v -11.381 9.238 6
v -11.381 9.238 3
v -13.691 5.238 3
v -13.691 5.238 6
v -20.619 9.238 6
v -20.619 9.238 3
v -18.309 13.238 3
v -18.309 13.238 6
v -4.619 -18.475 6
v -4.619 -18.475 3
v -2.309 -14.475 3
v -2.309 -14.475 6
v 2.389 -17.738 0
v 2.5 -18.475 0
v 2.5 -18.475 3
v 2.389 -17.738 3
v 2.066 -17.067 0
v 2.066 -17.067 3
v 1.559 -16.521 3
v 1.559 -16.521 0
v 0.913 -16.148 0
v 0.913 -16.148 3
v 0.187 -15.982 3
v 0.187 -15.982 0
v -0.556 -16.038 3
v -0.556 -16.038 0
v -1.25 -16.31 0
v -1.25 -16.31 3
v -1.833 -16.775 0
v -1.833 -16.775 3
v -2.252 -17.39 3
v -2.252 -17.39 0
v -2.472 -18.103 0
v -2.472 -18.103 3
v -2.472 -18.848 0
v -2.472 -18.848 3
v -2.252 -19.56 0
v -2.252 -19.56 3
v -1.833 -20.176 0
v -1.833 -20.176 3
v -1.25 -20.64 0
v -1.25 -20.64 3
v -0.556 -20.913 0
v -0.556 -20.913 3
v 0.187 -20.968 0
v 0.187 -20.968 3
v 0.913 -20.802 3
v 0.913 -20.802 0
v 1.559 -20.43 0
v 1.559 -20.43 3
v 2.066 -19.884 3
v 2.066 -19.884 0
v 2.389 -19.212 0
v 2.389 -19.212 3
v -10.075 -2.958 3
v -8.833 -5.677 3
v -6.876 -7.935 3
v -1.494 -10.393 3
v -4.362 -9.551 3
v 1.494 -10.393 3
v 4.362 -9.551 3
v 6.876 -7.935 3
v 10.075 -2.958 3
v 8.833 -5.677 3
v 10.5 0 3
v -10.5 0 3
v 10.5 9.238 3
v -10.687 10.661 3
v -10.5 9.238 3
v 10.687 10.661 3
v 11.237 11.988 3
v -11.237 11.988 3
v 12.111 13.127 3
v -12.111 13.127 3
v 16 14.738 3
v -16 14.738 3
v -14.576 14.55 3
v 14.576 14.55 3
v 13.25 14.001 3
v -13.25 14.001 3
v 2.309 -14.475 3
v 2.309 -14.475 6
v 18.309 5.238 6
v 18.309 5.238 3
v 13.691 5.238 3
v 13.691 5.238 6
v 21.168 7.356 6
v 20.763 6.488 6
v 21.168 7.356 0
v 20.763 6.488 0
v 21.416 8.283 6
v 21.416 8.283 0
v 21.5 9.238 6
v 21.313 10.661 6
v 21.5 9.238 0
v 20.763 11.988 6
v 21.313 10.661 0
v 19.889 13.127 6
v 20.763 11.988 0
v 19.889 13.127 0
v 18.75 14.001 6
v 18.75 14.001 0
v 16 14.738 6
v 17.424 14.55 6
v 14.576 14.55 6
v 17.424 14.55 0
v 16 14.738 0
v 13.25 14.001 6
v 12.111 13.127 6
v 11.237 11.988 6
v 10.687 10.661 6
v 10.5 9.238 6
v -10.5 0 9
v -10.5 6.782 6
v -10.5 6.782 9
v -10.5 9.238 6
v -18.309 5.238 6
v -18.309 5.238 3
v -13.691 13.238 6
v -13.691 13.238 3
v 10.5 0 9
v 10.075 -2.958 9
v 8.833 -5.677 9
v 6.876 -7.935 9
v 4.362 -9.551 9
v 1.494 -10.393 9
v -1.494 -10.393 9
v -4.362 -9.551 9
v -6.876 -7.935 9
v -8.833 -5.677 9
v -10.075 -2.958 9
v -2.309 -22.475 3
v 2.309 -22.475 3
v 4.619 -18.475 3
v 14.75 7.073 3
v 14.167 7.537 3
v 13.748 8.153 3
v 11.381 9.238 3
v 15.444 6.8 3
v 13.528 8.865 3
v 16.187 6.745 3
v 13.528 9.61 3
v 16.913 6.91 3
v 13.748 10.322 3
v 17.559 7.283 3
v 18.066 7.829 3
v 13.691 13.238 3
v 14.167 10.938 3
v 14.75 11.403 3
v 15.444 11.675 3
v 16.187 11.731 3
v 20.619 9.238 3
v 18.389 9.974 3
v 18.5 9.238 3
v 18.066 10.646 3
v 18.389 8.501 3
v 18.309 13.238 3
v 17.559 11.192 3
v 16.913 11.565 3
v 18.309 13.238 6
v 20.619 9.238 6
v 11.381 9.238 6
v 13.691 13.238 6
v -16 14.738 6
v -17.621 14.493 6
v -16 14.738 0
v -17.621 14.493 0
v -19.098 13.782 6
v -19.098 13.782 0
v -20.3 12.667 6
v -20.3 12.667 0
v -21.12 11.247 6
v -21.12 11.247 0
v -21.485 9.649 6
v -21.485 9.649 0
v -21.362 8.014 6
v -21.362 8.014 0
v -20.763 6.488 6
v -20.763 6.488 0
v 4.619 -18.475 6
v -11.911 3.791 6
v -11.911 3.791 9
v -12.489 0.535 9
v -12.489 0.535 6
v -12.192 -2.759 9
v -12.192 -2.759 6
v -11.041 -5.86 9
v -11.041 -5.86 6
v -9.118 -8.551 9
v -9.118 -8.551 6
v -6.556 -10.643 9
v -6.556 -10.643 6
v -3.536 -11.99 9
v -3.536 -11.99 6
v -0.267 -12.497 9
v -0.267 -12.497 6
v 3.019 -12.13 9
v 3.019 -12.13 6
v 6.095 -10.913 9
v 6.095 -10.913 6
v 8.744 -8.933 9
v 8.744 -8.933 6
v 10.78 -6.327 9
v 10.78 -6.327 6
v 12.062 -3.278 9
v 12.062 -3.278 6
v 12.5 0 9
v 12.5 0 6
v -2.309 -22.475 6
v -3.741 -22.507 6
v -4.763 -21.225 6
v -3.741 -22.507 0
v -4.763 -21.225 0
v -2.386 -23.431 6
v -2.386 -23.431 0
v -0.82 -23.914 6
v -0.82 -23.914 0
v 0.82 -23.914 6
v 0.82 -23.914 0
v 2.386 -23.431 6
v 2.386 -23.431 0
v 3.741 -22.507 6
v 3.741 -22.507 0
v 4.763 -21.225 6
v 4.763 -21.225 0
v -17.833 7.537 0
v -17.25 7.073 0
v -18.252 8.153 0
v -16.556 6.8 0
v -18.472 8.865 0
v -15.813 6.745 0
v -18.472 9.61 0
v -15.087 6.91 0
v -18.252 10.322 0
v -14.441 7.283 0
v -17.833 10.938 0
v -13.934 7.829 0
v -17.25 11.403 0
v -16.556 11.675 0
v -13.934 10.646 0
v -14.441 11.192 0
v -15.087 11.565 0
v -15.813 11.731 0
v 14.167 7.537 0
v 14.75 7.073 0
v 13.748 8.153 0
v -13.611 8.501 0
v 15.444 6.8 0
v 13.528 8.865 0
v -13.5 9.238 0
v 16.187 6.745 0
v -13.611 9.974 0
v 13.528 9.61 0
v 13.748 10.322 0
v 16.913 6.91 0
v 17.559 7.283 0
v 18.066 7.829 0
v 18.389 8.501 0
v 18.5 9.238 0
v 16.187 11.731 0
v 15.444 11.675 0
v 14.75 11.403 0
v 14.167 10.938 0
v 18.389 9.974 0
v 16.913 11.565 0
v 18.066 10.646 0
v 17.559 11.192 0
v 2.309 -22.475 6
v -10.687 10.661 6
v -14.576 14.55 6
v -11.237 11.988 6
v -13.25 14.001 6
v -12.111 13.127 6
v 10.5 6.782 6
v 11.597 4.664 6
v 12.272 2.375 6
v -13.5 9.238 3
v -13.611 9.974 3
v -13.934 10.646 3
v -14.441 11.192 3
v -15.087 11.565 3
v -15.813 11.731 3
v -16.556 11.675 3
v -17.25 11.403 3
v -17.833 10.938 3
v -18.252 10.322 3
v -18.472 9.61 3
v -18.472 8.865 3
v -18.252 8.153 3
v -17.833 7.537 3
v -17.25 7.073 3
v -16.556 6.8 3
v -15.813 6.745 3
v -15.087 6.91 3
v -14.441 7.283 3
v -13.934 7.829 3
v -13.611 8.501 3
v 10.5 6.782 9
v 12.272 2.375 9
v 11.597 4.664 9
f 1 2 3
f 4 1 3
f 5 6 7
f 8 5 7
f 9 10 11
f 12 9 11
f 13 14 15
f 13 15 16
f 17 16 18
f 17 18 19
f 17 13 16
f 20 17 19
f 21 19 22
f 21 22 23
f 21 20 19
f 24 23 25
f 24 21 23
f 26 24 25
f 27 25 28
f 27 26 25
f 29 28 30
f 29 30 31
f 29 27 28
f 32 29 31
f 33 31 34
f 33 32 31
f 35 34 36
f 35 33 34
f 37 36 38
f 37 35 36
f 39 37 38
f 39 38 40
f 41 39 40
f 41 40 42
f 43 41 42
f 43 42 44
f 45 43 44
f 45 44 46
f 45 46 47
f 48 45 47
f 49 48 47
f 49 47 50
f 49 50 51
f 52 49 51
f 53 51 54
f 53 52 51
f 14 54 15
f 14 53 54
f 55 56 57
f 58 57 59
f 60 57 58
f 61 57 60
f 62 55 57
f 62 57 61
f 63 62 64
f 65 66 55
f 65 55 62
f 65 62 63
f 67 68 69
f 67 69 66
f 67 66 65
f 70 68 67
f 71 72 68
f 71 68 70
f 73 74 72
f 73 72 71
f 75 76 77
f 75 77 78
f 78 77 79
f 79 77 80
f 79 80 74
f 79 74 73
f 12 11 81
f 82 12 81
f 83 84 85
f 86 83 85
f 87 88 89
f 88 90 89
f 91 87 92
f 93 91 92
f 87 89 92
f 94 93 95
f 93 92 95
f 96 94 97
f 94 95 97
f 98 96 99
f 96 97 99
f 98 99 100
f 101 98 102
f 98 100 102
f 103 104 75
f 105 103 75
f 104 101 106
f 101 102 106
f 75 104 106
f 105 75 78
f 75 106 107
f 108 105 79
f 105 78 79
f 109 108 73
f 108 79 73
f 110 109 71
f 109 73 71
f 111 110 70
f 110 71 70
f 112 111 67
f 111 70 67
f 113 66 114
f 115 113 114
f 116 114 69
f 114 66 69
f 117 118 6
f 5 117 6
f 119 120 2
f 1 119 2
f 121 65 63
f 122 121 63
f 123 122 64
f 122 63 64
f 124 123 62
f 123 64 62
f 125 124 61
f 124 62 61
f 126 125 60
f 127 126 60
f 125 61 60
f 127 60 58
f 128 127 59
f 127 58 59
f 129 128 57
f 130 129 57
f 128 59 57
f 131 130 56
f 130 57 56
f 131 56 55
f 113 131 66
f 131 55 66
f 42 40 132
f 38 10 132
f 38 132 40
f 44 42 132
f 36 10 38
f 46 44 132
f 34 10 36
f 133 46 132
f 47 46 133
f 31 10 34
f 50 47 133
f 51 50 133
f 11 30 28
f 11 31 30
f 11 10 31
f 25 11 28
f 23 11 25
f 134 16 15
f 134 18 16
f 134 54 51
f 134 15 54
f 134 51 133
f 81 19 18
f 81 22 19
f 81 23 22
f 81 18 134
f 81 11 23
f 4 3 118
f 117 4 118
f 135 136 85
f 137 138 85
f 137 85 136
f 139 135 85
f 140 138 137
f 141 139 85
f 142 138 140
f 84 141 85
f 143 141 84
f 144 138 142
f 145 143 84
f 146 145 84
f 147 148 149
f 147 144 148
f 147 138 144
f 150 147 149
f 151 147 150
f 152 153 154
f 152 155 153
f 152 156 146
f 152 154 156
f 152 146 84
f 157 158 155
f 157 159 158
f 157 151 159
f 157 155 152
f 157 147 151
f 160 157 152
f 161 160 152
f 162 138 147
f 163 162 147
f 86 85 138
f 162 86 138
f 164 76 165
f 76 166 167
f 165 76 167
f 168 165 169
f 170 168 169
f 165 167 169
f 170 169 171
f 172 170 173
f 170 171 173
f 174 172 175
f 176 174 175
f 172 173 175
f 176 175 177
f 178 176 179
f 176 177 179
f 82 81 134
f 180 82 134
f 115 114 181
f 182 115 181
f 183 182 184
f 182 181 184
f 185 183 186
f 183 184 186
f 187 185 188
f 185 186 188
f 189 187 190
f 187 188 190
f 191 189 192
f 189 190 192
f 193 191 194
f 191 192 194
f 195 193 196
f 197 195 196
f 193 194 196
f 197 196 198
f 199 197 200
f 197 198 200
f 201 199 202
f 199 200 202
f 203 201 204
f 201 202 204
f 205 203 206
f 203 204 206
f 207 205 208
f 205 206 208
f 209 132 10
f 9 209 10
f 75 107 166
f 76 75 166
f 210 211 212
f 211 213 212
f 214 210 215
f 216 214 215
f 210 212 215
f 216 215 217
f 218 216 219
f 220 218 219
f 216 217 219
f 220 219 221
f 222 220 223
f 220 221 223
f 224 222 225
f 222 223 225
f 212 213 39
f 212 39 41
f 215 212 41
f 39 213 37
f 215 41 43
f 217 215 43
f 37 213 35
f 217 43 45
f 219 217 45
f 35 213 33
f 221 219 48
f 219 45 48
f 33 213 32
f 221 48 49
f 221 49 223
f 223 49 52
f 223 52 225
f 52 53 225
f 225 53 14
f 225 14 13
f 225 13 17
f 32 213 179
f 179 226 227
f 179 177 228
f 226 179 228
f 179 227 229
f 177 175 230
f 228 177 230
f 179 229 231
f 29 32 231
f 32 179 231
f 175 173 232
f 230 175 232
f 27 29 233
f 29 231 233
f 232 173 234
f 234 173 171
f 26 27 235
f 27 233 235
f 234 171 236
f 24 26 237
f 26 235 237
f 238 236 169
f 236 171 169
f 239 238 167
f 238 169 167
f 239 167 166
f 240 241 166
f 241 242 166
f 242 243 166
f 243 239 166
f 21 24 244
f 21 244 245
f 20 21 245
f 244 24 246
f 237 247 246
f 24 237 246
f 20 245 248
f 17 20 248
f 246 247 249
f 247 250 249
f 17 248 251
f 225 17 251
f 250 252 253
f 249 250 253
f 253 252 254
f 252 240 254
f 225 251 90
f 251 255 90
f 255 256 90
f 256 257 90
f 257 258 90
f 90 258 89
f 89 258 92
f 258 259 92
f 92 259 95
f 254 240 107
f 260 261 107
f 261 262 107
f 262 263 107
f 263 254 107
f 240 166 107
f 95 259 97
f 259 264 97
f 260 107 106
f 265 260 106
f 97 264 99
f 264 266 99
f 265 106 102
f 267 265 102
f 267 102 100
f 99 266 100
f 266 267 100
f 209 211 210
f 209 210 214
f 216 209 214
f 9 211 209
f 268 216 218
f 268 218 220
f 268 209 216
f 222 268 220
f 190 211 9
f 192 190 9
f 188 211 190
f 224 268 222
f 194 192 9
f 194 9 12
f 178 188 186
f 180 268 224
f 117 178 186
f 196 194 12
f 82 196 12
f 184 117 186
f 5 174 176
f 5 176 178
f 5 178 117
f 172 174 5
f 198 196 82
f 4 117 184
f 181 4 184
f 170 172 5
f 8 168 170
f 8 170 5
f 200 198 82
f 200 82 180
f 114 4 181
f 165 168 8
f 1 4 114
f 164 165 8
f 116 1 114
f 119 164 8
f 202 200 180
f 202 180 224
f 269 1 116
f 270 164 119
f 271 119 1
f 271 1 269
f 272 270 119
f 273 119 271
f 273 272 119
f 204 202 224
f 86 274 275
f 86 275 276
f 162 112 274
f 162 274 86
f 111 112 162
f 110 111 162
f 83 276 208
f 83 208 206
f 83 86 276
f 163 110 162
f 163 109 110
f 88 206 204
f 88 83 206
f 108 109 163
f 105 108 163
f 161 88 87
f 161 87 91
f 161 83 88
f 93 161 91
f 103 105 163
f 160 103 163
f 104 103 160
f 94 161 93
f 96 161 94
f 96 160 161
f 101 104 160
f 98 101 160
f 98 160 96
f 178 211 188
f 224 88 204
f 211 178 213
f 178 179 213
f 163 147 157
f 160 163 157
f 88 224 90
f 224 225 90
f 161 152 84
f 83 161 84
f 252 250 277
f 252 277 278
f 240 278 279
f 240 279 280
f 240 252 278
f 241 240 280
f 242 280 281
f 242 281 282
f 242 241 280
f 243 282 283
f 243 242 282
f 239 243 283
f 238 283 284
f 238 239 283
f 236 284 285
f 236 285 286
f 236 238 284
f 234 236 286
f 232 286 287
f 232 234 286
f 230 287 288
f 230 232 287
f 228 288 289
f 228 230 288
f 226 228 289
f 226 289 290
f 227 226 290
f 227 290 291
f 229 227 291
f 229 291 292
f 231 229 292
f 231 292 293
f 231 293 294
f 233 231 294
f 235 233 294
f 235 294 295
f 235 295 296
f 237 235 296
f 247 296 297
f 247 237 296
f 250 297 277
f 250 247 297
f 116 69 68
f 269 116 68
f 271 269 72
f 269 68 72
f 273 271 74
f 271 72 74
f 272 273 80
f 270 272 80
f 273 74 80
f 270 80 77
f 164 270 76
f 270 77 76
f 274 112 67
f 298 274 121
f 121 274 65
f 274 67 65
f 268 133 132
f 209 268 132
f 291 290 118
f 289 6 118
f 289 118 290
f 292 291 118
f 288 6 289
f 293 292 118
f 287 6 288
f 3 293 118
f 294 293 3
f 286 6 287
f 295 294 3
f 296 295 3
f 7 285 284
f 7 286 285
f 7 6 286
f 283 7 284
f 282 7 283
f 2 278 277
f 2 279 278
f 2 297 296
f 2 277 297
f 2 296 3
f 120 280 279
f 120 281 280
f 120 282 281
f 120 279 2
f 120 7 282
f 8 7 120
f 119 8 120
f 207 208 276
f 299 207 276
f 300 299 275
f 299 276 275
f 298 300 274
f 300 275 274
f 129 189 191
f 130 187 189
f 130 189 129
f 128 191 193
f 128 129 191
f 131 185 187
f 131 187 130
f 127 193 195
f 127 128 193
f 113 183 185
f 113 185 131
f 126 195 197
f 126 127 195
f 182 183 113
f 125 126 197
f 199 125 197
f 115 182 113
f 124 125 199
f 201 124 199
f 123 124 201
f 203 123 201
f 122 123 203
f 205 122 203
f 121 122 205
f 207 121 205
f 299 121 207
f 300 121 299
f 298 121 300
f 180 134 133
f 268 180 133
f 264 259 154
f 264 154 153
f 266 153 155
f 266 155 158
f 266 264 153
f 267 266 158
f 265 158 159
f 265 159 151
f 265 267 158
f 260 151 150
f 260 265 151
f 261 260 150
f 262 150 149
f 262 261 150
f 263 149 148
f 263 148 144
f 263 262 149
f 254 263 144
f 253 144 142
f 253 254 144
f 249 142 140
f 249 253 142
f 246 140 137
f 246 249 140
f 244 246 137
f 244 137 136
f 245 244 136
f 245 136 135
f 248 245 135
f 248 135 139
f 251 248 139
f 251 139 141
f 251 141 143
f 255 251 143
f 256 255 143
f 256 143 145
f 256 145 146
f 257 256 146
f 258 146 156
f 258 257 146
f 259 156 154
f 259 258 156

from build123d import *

# Parameters (mm, degrees)
F0_R     = 2.5
F1_DEPTH = 3
F2_START = 3
F2_DEPTH = 3
F3_START = 3
F3_DEPTH = 6


# Not quite as in the source:
# - a feature names something its author has since deleted; it is built from what else it names


with BuildPart() as f1:
    # F0 (on Top) → F1 (new body)
    with BuildSketch(Plane.XY):
        with BuildLine():
            ThreePointArc((-10.5, 0), (0, -10.5), (10.5, 0))
            ThreePointArc((10.5, 0), (0, 10.5), (-10.5, 0))
        make_face()
        with BuildLine():
            Line((10.5, 9.237604307), (10.5, 6.7823299831))
            ThreePointArc((10.5, 6.7823299831), (11.9895788083, 3.5355339059), (12.5, 0))
            ThreePointArc((12.5, 0), (-3.5355339059, -11.9895788083), (-10.5, 6.7823299831))
            Line((-10.5, 6.7823299831), (-10.5, 9.237604307))
            ThreePointArc((-10.5, 9.237604307), (-14.5764952519, 3.9250122624), (-20.7631397208, 6.487604307))
            Line((-20.7631397208, 6.487604307), (-4.7631397208, -21.2252086141))
            ThreePointArc((-4.7631397208, -21.2252086141), (-1.4235047481, -13.1626165695), (5.5, -18.4752086141))
            ThreePointArc((5.5, -18.4752086141), (5.3125920446, -19.8987133621), (4.7631397208, -21.2252086141))
            Line((4.7631397208, -21.2252086141), (20.7631397208, 6.487604307))
            ThreePointArc((20.7631397208, 6.487604307), (14.5764952519, 3.9250122624), (10.5, 9.237604307))
        make_face()
        with BuildLine():
            ThreePointArc((16, 14.737604307), (12.1109127035, 13.1266916036), (10.5, 9.237604307))
            ThreePointArc((10.5, 9.237604307), (14.5764952519, 3.9250122624), (20.7631397208, 6.487604307))
            ThreePointArc((20.7631397208, 6.487604307), (21.3125920446, 7.814099559), (21.5, 9.237604307))
            ThreePointArc((21.5, 9.237604307), (19.8890872965, 13.1266916036), (16, 14.737604307))
        make_face()
        Polygon((11.3811978465, 9.237604307), (13.6905989232, 13.237604307), (18.3094010768, 13.237604307), (20.6188021535, 9.237604307), (18.3094010768, 5.237604307), (13.6905989232, 5.237604307), align=None, mode=Mode.SUBTRACT)
        with BuildLine():
            ThreePointArc((-20.7631397208, 6.487604307), (-14.5764952519, 3.9250122624), (-10.5, 9.237604307))
            ThreePointArc((-10.5, 9.237604307), (-12.1109127035, 13.1266916036), (-16, 14.737604307))
            ThreePointArc((-16, 14.737604307), (-20.7631397208, 11.987604307), (-20.7631397208, 6.487604307))
        make_face()
        Polygon((-18.3094010768, 13.237604307), (-13.6905989232, 13.237604307), (-11.3811978465, 9.237604307), (-13.6905989232, 5.237604307), (-18.3094010768, 5.237604307), (-20.6188021535, 9.237604307), align=None, mode=Mode.SUBTRACT)
        with BuildLine():
            ThreePointArc((-4.7631397208, -21.2252086141), (0, -23.9752086141), (4.7631397208, -21.2252086141))
            ThreePointArc((4.7631397208, -21.2252086141), (5.3125920446, -19.8987133621), (5.5, -18.4752086141))
            ThreePointArc((5.5, -18.4752086141), (-1.4235047481, -13.1626165695), (-4.7631397208, -21.2252086141))
        make_face()
        Polygon((-2.3094010768, -22.4752086141), (-4.6188021535, -18.4752086141), (-2.3094010768, -14.4752086141), (2.3094010768, -14.4752086141), (4.6188021535, -18.4752086141), (2.3094010768, -22.4752086141), align=None, mode=Mode.SUBTRACT)
        with BuildLine():
            Line((10.5, 6.7823299831), (10.5, 0))
            ThreePointArc((10.5, 0), (0, -10.5), (-10.5, 0))
            Line((-10.5, 0), (-10.5, 6.7823299831))
            ThreePointArc((-10.5, 6.7823299831), (-3.5355339059, -11.9895788083), (12.5, 0))
            ThreePointArc((12.5, 0), (11.9895788083, 3.5355339059), (10.5, 6.7823299831))
        make_face()
        with BuildLine():
            ThreePointArc((-10.5, 6.7823299831), (0, 12.5), (10.5, 6.7823299831))
            Line((10.5, 6.7823299831), (10.5, 9.237604307))
            Line((10.5, 9.237604307), (10.5, 14.737604307))
            Line((10.5, 14.737604307), (-10.5, 14.737604307))
            Line((-10.5, 14.737604307), (-10.5, 9.237604307))
            Line((-10.5, 9.237604307), (-10.5, 6.7823299831))
        make_face()
        Polygon((18.3094010768, 13.237604307), (13.6905989232, 13.237604307), (11.3811978465, 9.237604307), (13.6905989232, 5.237604307), (18.3094010768, 5.237604307), (20.6188021535, 9.237604307), align=None)
        with Locations((16, 9.237604307)):
            Circle(F0_R, mode=Mode.SUBTRACT)
        Polygon((-2.3094010768, -14.4752086141), (-4.6188021535, -18.4752086141), (-2.3094010768, -22.4752086141), (2.3094010768, -22.4752086141), (4.6188021535, -18.4752086141), (2.3094010768, -14.4752086141), align=None)
        with Locations((0, -18.4752086141)):
            Circle(F0_R, mode=Mode.SUBTRACT)
        Polygon((-11.3811978465, 9.237604307), (-13.6905989232, 13.237604307), (-18.3094010768, 13.237604307), (-20.6188021535, 9.237604307), (-18.3094010768, 5.237604307), (-13.6905989232, 5.237604307), align=None)
        with Locations((-16, 9.237604307)):
            Circle(F0_R, mode=Mode.SUBTRACT)
        with BuildLine():
            ThreePointArc((-10.5, 0), (0, 10.5), (10.5, 0))
            Line((10.5, 0), (10.5, 6.7823299831))
            ThreePointArc((10.5, 6.7823299831), (0, 12.5), (-10.5, 6.7823299831))
            Line((-10.5, 6.7823299831), (-10.5, 0))
        make_face()
        with BuildLine():
            Line((10.5, 14.737604307), (10.5, 9.237604307))
            ThreePointArc((10.5, 9.237604307), (12.1109127035, 13.1266916036), (16, 14.737604307))
            Line((16, 14.737604307), (10.5, 14.737604307))
        make_face()
        with BuildLine():
            ThreePointArc((-16, 14.737604307), (-12.1109127035, 13.1266916036), (-10.5, 9.237604307))
            Line((-10.5, 9.237604307), (-10.5, 14.737604307))
            Line((-10.5, 14.737604307), (-16, 14.737604307))
        make_face()
    extrude(amount=F1_DEPTH)

    # F0 (on Top) → F2 (join)
    with BuildSketch(Plane.XY.offset(F2_START)):
        with BuildLine():
            ThreePointArc((-20.7631397208, 6.487604307), (-14.5764952519, 3.9250122624), (-10.5, 9.237604307))
            ThreePointArc((-10.5, 9.237604307), (-12.1109127035, 13.1266916036), (-16, 14.737604307))
            ThreePointArc((-16, 14.737604307), (-20.7631397208, 11.987604307), (-20.7631397208, 6.487604307))
        make_face()
        Polygon((-18.3094010768, 13.237604307), (-13.6905989232, 13.237604307), (-11.3811978465, 9.237604307), (-13.6905989232, 5.237604307), (-18.3094010768, 5.237604307), (-20.6188021535, 9.237604307), align=None, mode=Mode.SUBTRACT)
        with BuildLine():
            ThreePointArc((-4.7631397208, -21.2252086141), (0, -23.9752086141), (4.7631397208, -21.2252086141))
            ThreePointArc((4.7631397208, -21.2252086141), (5.3125920446, -19.8987133621), (5.5, -18.4752086141))
            ThreePointArc((5.5, -18.4752086141), (-1.4235047481, -13.1626165695), (-4.7631397208, -21.2252086141))
        make_face()
        Polygon((-2.3094010768, -22.4752086141), (-4.6188021535, -18.4752086141), (-2.3094010768, -14.4752086141), (2.3094010768, -14.4752086141), (4.6188021535, -18.4752086141), (2.3094010768, -22.4752086141), align=None, mode=Mode.SUBTRACT)
        with BuildLine():
            ThreePointArc((16, 14.737604307), (12.1109127035, 13.1266916036), (10.5, 9.237604307))
            ThreePointArc((10.5, 9.237604307), (14.5764952519, 3.9250122624), (20.7631397208, 6.487604307))
            ThreePointArc((20.7631397208, 6.487604307), (21.3125920446, 7.814099559), (21.5, 9.237604307))
            ThreePointArc((21.5, 9.237604307), (19.8890872965, 13.1266916036), (16, 14.737604307))
        make_face()
        Polygon((11.3811978465, 9.237604307), (13.6905989232, 13.237604307), (18.3094010768, 13.237604307), (20.6188021535, 9.237604307), (18.3094010768, 5.237604307), (13.6905989232, 5.237604307), align=None, mode=Mode.SUBTRACT)
        with BuildLine():
            Line((10.5, 9.237604307), (10.5, 6.7823299831))
            ThreePointArc((10.5, 6.7823299831), (11.9895788083, 3.5355339059), (12.5, 0))
            ThreePointArc((12.5, 0), (-3.5355339059, -11.9895788083), (-10.5, 6.7823299831))
            Line((-10.5, 6.7823299831), (-10.5, 9.237604307))
            ThreePointArc((-10.5, 9.237604307), (-14.5764952519, 3.9250122624), (-20.7631397208, 6.487604307))
            Line((-20.7631397208, 6.487604307), (-4.7631397208, -21.2252086141))
            ThreePointArc((-4.7631397208, -21.2252086141), (-1.4235047481, -13.1626165695), (5.5, -18.4752086141))
            ThreePointArc((5.5, -18.4752086141), (5.3125920446, -19.8987133621), (4.7631397208, -21.2252086141))
            Line((4.7631397208, -21.2252086141), (20.7631397208, 6.487604307))
            ThreePointArc((20.7631397208, 6.487604307), (14.5764952519, 3.9250122624), (10.5, 9.237604307))
        make_face()
    extrude(amount=F2_DEPTH)

    # F0 (on Top) → F3 (join)
    with BuildSketch(Plane.XY.offset(F3_START)):
        with BuildLine():
            Line((10.5, 6.7823299831), (10.5, 0))
            ThreePointArc((10.5, 0), (0, -10.5), (-10.5, 0))
            Line((-10.5, 0), (-10.5, 6.7823299831))
            ThreePointArc((-10.5, 6.7823299831), (-3.5355339059, -11.9895788083), (12.5, 0))
            ThreePointArc((12.5, 0), (11.9895788083, 3.5355339059), (10.5, 6.7823299831))
        make_face()
    extrude(amount=F3_DEPTH)


solid = f1.part
